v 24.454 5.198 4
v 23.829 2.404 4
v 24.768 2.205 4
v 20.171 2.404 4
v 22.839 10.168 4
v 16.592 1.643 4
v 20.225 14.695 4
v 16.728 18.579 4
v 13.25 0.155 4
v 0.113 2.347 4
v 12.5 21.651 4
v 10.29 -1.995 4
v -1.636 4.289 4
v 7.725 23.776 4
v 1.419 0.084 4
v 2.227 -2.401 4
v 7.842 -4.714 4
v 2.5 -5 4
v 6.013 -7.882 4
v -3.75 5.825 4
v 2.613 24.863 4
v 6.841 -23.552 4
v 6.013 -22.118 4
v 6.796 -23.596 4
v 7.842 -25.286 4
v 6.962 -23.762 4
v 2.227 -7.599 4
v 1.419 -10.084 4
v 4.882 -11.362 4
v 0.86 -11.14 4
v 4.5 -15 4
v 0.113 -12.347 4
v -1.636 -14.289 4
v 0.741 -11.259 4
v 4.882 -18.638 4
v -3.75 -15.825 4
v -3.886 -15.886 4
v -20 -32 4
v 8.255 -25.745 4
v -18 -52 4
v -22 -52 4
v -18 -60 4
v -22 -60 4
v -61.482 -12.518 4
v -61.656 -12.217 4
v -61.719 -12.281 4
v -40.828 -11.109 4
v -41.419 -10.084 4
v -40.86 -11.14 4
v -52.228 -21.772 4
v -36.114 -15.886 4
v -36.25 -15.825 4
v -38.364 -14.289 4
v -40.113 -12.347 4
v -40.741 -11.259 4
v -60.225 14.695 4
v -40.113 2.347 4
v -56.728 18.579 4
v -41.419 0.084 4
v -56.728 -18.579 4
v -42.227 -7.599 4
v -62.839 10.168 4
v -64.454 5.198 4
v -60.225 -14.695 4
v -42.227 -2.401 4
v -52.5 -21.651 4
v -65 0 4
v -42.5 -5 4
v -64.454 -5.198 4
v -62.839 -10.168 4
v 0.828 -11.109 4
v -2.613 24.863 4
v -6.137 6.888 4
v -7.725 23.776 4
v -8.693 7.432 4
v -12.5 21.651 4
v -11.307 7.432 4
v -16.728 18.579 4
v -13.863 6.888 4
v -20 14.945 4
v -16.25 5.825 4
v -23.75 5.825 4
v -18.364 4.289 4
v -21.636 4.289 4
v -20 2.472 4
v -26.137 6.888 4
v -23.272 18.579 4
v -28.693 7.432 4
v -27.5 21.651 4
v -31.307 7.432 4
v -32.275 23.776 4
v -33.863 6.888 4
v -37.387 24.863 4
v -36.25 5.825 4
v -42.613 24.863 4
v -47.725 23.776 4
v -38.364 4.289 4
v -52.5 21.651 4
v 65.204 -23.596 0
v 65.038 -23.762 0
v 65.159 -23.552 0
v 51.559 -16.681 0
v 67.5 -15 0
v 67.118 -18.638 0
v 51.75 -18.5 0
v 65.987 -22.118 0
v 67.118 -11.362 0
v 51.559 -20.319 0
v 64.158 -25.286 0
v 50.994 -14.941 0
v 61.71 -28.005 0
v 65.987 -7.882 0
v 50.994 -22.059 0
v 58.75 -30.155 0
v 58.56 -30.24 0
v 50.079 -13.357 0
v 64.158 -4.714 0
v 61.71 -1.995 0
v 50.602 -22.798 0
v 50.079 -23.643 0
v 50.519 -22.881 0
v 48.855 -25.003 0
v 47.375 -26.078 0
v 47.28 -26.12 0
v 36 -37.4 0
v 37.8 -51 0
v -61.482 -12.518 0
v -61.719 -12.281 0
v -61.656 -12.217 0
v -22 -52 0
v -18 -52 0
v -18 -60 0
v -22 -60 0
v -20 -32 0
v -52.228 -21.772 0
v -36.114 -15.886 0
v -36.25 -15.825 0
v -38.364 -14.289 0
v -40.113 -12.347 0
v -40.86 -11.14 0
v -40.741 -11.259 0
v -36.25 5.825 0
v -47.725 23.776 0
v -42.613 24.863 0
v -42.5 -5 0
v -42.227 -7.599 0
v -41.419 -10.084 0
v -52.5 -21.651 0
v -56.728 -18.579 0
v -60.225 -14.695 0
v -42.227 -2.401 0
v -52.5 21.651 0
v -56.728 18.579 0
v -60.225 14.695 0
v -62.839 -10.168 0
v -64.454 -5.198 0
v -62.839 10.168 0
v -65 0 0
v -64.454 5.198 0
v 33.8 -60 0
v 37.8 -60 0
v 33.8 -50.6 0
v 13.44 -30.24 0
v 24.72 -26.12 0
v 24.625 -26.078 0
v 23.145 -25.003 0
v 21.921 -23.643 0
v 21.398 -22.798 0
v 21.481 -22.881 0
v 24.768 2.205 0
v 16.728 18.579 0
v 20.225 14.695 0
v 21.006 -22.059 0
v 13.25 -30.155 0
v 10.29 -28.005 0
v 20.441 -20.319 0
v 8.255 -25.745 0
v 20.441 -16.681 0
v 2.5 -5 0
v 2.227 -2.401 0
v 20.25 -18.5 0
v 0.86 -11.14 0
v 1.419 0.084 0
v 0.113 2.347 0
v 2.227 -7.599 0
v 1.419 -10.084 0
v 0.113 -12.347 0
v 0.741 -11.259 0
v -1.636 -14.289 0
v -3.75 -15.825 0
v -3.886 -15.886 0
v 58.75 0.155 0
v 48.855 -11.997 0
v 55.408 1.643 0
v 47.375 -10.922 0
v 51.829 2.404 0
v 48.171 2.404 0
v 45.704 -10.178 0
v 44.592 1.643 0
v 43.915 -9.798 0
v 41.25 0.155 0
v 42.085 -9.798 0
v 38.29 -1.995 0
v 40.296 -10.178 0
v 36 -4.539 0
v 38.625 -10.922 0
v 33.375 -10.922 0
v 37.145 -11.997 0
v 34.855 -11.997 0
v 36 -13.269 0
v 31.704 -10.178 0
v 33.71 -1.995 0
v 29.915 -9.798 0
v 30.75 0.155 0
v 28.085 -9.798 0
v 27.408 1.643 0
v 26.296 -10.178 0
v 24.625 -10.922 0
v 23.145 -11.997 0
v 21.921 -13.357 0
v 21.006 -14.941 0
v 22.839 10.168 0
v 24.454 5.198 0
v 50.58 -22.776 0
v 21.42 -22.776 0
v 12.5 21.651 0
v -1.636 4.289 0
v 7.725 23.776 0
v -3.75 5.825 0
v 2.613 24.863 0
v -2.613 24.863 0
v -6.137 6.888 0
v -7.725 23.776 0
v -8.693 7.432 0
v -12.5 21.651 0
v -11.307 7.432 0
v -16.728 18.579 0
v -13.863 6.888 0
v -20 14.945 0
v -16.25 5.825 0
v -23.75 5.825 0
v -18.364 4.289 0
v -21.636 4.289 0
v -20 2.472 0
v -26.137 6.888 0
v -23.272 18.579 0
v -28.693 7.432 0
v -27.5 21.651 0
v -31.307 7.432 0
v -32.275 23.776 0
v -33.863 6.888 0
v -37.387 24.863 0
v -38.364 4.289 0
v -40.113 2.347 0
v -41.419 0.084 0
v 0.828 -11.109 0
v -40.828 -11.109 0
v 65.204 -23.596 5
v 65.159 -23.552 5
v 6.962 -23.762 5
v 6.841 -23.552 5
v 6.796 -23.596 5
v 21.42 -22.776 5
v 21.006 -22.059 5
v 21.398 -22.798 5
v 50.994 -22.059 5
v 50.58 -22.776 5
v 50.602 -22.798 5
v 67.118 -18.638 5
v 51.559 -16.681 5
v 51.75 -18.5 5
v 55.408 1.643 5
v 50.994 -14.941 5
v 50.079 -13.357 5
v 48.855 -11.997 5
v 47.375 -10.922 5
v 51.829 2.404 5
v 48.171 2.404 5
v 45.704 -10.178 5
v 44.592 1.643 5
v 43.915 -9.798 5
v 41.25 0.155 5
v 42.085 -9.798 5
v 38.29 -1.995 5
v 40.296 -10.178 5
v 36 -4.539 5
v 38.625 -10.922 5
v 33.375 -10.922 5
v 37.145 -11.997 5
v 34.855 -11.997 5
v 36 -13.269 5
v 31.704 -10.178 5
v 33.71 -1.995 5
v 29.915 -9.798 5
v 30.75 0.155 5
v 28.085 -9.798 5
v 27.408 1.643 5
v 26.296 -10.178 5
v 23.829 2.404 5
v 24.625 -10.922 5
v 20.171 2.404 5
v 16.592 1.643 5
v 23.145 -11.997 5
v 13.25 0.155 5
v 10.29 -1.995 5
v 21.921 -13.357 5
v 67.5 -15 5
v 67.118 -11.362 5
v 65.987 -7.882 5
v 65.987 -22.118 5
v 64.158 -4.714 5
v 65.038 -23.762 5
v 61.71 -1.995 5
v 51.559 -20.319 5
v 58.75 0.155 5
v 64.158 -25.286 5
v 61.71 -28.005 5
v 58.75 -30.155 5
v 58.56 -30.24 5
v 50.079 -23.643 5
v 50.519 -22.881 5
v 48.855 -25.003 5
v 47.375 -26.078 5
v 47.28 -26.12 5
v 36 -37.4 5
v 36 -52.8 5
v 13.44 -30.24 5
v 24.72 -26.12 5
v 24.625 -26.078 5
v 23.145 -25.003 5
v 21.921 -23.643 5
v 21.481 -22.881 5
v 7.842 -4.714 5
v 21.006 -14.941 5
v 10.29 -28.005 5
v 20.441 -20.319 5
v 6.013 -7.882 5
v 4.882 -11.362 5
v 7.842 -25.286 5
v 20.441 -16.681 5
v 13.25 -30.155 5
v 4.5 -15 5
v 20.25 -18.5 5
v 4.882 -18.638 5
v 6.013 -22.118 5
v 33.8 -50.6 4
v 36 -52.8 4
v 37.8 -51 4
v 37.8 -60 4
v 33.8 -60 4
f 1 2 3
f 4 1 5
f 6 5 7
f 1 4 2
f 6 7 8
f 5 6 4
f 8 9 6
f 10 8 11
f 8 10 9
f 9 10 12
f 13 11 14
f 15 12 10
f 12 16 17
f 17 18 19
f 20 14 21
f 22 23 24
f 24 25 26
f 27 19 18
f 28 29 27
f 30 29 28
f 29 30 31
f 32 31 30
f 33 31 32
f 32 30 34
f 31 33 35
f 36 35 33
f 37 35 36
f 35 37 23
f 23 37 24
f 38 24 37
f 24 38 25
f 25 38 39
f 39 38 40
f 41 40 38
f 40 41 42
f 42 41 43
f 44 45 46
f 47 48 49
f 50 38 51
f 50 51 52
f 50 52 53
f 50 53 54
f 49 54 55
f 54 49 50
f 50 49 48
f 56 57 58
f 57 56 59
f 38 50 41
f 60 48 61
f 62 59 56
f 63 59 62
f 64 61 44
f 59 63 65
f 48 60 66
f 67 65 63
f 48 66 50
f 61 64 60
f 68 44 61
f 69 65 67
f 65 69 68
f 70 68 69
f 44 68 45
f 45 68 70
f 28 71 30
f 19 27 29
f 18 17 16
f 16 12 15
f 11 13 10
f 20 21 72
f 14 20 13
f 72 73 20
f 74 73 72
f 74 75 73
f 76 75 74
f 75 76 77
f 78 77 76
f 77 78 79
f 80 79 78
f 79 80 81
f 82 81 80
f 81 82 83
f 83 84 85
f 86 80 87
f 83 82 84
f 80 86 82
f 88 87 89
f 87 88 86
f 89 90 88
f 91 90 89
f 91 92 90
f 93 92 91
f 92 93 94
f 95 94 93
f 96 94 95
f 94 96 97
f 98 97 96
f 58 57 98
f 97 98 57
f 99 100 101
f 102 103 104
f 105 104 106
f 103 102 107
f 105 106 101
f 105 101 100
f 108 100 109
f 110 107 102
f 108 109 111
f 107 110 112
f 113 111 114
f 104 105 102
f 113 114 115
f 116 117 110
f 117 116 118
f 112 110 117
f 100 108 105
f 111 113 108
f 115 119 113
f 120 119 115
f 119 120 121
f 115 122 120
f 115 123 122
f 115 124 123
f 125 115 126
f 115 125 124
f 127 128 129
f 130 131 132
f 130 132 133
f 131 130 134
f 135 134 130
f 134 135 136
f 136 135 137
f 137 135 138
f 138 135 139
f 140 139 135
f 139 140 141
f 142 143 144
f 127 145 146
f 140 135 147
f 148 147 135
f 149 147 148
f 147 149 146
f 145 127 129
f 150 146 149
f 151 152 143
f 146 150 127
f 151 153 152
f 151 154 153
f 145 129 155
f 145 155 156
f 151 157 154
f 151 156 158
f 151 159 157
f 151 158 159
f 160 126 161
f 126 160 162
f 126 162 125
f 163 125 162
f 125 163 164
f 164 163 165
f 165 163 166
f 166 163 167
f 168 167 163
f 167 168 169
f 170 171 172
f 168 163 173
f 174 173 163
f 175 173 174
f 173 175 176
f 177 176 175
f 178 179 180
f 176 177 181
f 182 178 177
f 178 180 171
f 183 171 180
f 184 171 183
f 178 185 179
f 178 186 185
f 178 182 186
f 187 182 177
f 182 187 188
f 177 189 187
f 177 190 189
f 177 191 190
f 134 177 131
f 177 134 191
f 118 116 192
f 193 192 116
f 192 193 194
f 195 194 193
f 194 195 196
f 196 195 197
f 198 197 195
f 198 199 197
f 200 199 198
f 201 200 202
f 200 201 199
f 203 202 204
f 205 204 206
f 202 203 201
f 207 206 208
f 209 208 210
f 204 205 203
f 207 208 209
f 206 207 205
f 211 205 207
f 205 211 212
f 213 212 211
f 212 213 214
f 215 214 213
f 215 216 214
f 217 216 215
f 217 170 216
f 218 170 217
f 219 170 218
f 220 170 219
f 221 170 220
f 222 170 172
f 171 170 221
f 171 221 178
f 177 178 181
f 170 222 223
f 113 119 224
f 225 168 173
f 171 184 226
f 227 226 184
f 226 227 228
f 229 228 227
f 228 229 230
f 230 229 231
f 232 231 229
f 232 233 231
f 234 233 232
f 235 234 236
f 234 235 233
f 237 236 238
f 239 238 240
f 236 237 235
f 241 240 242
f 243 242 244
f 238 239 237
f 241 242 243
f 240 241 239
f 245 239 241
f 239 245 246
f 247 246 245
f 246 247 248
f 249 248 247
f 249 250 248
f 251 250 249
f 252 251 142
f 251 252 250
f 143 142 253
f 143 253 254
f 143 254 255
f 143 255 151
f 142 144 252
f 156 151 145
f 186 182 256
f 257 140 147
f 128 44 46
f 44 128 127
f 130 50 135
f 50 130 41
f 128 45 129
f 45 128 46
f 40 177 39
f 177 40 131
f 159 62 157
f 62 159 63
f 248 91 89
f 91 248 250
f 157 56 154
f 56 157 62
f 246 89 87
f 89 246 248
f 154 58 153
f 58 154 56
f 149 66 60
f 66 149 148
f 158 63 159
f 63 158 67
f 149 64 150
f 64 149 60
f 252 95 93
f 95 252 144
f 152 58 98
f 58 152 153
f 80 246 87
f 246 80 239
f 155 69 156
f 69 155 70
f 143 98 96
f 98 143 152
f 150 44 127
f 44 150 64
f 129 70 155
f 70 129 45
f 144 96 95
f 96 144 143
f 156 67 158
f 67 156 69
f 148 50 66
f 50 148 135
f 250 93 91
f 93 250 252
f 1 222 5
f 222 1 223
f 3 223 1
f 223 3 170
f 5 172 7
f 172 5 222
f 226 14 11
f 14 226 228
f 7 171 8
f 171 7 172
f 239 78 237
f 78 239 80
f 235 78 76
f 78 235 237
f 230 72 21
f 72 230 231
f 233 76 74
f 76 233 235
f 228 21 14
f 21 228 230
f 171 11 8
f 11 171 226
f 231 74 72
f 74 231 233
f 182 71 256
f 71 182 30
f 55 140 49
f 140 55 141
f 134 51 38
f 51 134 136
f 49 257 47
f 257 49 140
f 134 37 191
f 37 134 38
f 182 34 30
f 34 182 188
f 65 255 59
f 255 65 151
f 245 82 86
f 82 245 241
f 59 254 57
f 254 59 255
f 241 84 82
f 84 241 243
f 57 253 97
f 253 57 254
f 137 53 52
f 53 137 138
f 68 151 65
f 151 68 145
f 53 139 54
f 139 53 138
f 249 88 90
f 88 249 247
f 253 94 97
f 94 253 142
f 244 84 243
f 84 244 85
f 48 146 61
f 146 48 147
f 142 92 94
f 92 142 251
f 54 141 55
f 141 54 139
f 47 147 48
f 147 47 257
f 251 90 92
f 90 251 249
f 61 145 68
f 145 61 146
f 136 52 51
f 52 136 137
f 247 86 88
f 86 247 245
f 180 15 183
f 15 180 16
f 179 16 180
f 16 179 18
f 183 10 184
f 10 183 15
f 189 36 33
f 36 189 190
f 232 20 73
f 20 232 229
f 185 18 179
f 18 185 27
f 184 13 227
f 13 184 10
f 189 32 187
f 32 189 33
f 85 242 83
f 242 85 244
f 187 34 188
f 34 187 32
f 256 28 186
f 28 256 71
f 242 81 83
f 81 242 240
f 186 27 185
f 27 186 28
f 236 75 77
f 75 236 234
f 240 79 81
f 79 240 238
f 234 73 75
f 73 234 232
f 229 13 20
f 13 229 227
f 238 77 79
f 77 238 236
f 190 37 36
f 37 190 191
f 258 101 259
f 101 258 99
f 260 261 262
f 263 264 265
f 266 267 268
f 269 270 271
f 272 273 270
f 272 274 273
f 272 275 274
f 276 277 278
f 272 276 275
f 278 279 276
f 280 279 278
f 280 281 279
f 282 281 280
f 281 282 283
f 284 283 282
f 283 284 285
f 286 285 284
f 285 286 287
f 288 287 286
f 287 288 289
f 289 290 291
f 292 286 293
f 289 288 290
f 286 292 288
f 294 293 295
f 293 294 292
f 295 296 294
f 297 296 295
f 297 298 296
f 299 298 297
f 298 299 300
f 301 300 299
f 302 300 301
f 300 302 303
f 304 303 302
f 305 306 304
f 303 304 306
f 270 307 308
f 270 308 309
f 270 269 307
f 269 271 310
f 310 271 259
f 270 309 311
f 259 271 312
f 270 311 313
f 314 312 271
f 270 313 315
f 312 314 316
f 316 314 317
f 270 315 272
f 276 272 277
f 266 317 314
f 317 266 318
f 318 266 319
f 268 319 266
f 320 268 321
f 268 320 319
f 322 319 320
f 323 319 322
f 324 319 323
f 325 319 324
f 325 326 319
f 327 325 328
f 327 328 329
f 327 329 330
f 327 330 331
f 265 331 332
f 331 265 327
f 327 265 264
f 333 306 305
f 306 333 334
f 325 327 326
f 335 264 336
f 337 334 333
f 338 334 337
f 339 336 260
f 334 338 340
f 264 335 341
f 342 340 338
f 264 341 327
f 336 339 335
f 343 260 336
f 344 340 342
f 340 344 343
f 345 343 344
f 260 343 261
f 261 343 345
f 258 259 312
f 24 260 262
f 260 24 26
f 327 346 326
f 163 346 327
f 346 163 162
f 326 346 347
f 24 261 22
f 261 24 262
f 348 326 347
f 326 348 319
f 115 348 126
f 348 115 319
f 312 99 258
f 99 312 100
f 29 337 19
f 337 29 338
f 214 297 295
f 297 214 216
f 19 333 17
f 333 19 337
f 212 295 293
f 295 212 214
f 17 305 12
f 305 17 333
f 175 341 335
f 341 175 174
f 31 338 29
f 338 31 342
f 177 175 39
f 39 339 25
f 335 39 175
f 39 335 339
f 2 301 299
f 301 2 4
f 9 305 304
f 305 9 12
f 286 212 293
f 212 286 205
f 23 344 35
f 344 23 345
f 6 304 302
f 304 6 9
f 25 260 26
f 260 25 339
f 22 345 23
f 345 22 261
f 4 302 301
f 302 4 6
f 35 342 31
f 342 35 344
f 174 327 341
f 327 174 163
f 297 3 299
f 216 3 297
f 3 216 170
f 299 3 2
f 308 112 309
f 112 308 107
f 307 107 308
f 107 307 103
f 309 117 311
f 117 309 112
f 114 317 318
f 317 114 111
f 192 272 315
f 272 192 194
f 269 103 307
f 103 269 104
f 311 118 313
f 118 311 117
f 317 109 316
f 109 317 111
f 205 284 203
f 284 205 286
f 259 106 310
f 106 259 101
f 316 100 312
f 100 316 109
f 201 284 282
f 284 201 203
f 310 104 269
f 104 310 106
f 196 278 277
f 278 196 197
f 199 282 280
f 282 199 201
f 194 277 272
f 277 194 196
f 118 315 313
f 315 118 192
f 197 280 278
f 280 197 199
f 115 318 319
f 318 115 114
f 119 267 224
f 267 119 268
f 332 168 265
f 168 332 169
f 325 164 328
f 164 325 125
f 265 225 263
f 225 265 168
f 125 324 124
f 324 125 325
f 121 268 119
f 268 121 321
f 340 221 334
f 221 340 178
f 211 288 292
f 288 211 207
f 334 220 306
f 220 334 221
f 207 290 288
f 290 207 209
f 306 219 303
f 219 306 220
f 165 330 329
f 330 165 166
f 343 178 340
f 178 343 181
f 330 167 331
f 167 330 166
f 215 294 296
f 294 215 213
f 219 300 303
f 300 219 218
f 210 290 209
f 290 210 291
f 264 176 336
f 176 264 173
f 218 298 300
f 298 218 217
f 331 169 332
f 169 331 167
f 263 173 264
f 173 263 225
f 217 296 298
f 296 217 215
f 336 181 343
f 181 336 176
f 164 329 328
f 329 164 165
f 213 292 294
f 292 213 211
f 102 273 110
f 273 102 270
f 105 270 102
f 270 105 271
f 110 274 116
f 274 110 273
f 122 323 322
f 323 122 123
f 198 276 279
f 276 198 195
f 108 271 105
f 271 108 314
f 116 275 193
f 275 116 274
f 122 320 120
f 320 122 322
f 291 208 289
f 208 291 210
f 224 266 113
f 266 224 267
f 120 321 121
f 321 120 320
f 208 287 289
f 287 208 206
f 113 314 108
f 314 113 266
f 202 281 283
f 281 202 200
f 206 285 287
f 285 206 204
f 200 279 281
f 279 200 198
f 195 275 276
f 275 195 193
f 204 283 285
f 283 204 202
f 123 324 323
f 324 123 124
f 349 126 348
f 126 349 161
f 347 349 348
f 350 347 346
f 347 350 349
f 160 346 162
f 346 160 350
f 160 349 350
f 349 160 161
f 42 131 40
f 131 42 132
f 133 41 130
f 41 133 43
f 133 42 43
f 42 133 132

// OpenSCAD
//1
difference(){
difference(){
union(){
translate([-40,0,0]) cylinder(4,25,25);
   cylinder(4,25,25);

translate([-20,-54,0]) rotate([0,0,45]) 
difference(){
cube([59,59,4]);
translate([45,45,0]) cube([20,20,4]);
}
}
}
translate([-10,-5,0])
scale([0.5,0.5,1])
difference(){
union(){
translate([-40,0,0]) cylinder(4,25,25);
   cylinder(4,25,25);

translate([-20,-54,0]) rotate([0,0,45]) 
difference(){
cube([59,59,4]);
translate([45,45,0]) cube([20,20,4]);
}
}
}
}
translate([-22,-60,0]) cube([4,10,4]);

//2
translate([50,-15,0])
union(){
scale([0.7,0.7,1])
difference(){
difference(){
union(){
translate([-40,0,0]) cylinder(5,25,25);
   cylinder(5,25,25);

translate([-20,-54,0]) rotate([0,0,45]) 
difference(){
cube([59,59,5]);
translate([45,45,0]) cube([20,20,5]);
}
}
}
translate([-10,-5,0])
scale([0.5,0.5,1])
difference(){
union(){
translate([-40,0,0]) cylinder(5,25,25);
   cylinder(5,25,25);

translate([-20,-54,0]) rotate([0,0,45]) 
difference(){
cube([59,59,5]);
translate([45,45,0]) cube([20,20,5]);
}
}
}
}
translate([-16.2,-45,0]) cube([4,10,4]);
}

 
